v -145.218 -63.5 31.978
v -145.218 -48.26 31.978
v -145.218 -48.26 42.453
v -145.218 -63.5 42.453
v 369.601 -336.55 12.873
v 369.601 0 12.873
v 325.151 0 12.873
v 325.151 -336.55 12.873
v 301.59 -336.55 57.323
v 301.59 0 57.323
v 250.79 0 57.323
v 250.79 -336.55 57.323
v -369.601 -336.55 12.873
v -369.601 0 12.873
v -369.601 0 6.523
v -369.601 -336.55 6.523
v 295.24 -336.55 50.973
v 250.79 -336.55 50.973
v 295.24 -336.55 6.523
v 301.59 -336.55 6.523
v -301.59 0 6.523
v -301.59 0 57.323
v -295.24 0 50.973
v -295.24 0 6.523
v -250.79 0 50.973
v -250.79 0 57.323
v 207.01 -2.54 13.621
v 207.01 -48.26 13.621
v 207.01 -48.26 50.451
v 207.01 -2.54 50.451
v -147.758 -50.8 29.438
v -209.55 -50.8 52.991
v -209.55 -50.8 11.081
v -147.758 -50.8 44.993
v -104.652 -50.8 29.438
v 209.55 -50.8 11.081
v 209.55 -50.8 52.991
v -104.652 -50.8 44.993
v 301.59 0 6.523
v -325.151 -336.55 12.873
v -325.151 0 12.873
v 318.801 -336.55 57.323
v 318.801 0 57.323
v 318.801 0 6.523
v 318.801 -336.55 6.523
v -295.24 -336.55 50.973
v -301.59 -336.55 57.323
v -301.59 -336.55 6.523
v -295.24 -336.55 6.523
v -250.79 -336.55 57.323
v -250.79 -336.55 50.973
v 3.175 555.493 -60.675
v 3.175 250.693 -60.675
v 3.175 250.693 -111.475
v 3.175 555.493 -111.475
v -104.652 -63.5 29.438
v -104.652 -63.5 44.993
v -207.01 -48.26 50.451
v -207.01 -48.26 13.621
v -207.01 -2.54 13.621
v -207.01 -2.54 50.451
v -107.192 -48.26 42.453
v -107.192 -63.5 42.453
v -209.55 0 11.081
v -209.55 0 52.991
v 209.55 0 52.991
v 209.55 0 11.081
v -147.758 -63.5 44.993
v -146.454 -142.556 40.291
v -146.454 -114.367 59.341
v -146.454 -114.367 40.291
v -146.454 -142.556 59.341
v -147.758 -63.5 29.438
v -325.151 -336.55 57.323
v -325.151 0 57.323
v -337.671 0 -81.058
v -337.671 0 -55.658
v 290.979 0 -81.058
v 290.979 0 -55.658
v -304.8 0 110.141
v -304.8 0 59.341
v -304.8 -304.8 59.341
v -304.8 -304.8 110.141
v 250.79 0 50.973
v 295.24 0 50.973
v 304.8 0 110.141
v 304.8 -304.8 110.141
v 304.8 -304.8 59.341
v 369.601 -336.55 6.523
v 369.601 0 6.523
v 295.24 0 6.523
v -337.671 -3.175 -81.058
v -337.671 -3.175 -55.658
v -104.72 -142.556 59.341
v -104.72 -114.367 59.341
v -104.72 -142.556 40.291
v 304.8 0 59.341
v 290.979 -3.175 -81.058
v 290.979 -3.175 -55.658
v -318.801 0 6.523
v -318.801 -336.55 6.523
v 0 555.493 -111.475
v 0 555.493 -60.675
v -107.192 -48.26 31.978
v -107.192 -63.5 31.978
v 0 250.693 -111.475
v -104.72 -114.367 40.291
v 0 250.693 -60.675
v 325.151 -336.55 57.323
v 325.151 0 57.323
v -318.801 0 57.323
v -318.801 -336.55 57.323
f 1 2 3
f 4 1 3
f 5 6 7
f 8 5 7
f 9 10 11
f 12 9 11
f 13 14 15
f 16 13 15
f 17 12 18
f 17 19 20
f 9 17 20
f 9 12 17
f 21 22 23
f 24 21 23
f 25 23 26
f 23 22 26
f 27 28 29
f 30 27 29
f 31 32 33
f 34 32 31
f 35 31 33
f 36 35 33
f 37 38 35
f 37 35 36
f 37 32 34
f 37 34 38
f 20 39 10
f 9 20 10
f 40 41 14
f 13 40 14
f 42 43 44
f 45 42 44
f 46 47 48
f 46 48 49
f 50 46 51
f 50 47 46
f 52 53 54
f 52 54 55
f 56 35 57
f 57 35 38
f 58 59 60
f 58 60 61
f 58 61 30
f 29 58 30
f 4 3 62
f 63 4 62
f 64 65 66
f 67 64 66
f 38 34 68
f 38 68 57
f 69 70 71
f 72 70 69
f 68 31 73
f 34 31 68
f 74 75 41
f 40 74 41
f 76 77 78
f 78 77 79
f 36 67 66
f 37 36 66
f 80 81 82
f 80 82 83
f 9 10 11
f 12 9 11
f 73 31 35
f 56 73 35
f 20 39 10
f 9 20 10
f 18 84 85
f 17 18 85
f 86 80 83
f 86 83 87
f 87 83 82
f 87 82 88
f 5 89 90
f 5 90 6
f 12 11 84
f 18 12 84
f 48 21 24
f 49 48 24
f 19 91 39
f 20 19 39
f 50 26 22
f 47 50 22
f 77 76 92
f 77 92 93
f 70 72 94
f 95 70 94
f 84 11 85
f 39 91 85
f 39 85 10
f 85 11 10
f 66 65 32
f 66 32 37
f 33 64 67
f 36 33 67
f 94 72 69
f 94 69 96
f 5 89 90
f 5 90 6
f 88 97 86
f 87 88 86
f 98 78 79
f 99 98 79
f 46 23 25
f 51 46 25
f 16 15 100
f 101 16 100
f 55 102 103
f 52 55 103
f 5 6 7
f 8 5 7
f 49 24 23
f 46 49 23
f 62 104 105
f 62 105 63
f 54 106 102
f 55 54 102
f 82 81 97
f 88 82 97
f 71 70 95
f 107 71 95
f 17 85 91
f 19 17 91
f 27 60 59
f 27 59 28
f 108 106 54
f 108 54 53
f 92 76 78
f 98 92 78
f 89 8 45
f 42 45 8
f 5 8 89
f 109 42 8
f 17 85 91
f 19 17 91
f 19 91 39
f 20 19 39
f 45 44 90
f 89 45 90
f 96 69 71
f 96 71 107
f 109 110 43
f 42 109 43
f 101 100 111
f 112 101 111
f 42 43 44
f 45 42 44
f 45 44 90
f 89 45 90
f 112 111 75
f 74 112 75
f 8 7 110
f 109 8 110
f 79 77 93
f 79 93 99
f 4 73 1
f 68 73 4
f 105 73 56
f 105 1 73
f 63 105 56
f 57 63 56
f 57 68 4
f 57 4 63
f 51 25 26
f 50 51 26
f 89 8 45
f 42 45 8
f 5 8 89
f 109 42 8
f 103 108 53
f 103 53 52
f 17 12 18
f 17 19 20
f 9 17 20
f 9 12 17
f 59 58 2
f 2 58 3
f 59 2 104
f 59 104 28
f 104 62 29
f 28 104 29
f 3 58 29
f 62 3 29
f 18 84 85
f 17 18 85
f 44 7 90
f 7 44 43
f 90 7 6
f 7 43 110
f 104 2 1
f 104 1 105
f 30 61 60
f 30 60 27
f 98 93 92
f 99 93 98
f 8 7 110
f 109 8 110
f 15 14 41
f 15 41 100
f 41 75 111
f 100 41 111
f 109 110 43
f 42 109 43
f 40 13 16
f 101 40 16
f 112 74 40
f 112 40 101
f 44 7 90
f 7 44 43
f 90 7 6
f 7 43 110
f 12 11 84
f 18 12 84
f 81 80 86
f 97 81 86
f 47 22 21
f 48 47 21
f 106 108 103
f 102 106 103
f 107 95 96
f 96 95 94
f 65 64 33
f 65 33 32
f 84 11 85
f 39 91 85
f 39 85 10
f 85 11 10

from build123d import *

# Parameters (mm, degrees)
F0_W      = 419.1
F0_H      = 41.91
F1_DEPTH  = 50.8
F0_W_2    = 609.6
F0_H_2    = 50.8
F2_DEPTH  = 304.8
F4_DEPTH  = 336.55
F5_DEPTH  = 336.55
F6_W      = 43.1060045958
F6_H      = 15.5551526695
F7_DEPTH  = 12.7
F8_T      = -2.54
F9_W      = 41.7341813445
F9_H      = 28.1890779734
F10_DEPTH = 19.05
F12_DEPTH = 25.4
F13_W     = 304.8
F13_H     = 50.8
F14_DEPTH = 3.175
F15_W     = 628.65
F15_H     = 25.4
F16_DEPTH = 3.175


with BuildPart() as f1:
    # F0 (on Front) → F1 (new body)
    with BuildSketch(Plane.XZ):
        with Locations((0, 32.036005367)):
            Rectangle(F0_W, F0_H)
    extrude(amount=F1_DEPTH)

    # F6 (on face) → F7 (join)
    with BuildSketch(Plane.XZ.offset(50.8)):
        with Locations((-126.2048408389, 37.2155820951)):
            Rectangle(F6_W, F6_H)
    extrude(amount=F7_DEPTH)

    # F8
    f8_openings = [f1.faces().sort_by_distance(p)[0] for p in [
        (-126.204841, -63.5, 37.215582),
    ]]
    offset(amount=F8_T, openings=f8_openings, kind=Kind.INTERSECTION)

    # F11 (on face) → F12 (cut)
    with BuildSketch(Plane.XZ.offset(142.5557434559)):
        Polygon((-104.7201529145, 59.341005367), (-125.5872435868, 40.291005367), (-104.7201529145, 40.291005367), align=None)
        Polygon((-125.5872435868, 40.291005367), (-146.454334259, 59.341005367), (-146.454334259, 40.291005367), align=None)
        Polygon((-104.7201529145, 59.341005367), (-146.454334259, 59.341005367), (-125.5872435868, 40.291005367), align=None)
    extrude(amount=F12_DEPTH, mode=Mode.SUBTRACT)


with BuildPart() as f2:
    # F0 (on Front) → F2 (new body)
    with BuildSketch(Plane.XZ):
        with Locations((0, 84.741005367)):
            Rectangle(F0_W_2, F0_H_2)
    extrude(amount=F2_DEPTH)


with BuildPart() as f4:
    # F3 (on Front) → F4 (new body)
    with BuildSketch(Plane.XZ):
        Polygon((301.590424836, 57.3228445721), (250.790424836, 57.3228445721), (250.790424836, 50.9728445721), (295.240424836, 50.9728445721), (295.240424836, 6.5228445721), (301.590424836, 6.5228445721), align=None)
    extrude(amount=F4_DEPTH)


with BuildPart() as f4b:
    # F3 (on Front) → F4, piece 2 (new body)
    with BuildSketch(Plane.XZ):
        Polygon((325.1507537066, 57.3228445721), (318.8007537066, 57.3228445721), (318.8007537066, 6.5228445721), (369.6007537066, 6.5228445721), (369.6007537066, 12.8728445721), (325.1507537066, 12.8728445721), align=None)
    extrude(amount=F4_DEPTH)


with BuildPart() as f5:
    # F3 (on Front) → F5 (new body)
    with BuildSketch(Plane.XZ):
        Polygon((301.590424836, 57.3228445721), (250.790424836, 57.3228445721), (250.790424836, 50.9728445721), (295.240424836, 50.9728445721), (295.240424836, 6.5228445721), (301.590424836, 6.5228445721), align=None)
    extrude(amount=F5_DEPTH)


with BuildPart() as f5b:
    # F3 (on Front) → F5, piece 2 (new body)
    with BuildSketch(Plane.XZ):
        Polygon((325.1507537066, 57.3228445721), (318.8007537066, 57.3228445721), (318.8007537066, 6.5228445721), (369.6007537066, 6.5228445721), (369.6007537066, 12.8728445721), (325.1507537066, 12.8728445721), align=None)
    extrude(amount=F5_DEPTH)


with BuildPart() as f5c:
    # F3 (on Front) → F5, piece 3 (new body)
    with BuildSketch(Plane.XZ):
        Polygon((-318.8007537066, 57.3228445721), (-325.1507537066, 57.3228445721), (-325.1507537066, 12.8728445721), (-369.6007537066, 12.8728445721), (-369.6007537066, 6.5228445721), (-318.8007537066, 6.5228445721), align=None)
    extrude(amount=F5_DEPTH)


with BuildPart() as f5d:
    # F3 (on Front) → F5, piece 4 (new body)
    with BuildSketch(Plane.XZ):
        Polygon((-295.240424836, 50.9728445721), (-250.790424836, 50.9728445721), (-250.790424836, 57.3228445721), (-301.590424836, 57.3228445721), (-301.590424836, 6.5228445721), (-295.240424836, 6.5228445721), align=None)
    extrude(amount=F5_DEPTH)


with BuildPart() as f10:
    # F9 (on face) → F10 (new body)
    with BuildSketch(Plane(origin=(0, 0, 59.341005367), x_dir=(1, 0, 0), z_dir=(0, 0, -1))):
        with Locations((-125.5872435868, 128.4612044692)):
            Rectangle(F9_W, F9_H)
    extrude(amount=F10_DEPTH)


with BuildPart() as f14:
    # F13 (on Right) → F14 (new body)
    with BuildSketch(Plane.YZ):
        with Locations((403.0925355504, -86.0749365926)):
            Rectangle(F13_W, F13_H)
    extrude(amount=F14_DEPTH)


with BuildPart() as f16:
    # F15 (on Front) → F16 (new body)
    with BuildSketch(Plane.XZ):
        with Locations((-23.3459185123, -68.3581817546)):
            Rectangle(F15_W, F15_H)
    extrude(amount=F16_DEPTH)


solid = Compound([f1.part, f2.part, f4.part, f4b.part, f5.part, f5b.part, f5c.part, f5d.part, f10.part, f14.part, f16.part])
